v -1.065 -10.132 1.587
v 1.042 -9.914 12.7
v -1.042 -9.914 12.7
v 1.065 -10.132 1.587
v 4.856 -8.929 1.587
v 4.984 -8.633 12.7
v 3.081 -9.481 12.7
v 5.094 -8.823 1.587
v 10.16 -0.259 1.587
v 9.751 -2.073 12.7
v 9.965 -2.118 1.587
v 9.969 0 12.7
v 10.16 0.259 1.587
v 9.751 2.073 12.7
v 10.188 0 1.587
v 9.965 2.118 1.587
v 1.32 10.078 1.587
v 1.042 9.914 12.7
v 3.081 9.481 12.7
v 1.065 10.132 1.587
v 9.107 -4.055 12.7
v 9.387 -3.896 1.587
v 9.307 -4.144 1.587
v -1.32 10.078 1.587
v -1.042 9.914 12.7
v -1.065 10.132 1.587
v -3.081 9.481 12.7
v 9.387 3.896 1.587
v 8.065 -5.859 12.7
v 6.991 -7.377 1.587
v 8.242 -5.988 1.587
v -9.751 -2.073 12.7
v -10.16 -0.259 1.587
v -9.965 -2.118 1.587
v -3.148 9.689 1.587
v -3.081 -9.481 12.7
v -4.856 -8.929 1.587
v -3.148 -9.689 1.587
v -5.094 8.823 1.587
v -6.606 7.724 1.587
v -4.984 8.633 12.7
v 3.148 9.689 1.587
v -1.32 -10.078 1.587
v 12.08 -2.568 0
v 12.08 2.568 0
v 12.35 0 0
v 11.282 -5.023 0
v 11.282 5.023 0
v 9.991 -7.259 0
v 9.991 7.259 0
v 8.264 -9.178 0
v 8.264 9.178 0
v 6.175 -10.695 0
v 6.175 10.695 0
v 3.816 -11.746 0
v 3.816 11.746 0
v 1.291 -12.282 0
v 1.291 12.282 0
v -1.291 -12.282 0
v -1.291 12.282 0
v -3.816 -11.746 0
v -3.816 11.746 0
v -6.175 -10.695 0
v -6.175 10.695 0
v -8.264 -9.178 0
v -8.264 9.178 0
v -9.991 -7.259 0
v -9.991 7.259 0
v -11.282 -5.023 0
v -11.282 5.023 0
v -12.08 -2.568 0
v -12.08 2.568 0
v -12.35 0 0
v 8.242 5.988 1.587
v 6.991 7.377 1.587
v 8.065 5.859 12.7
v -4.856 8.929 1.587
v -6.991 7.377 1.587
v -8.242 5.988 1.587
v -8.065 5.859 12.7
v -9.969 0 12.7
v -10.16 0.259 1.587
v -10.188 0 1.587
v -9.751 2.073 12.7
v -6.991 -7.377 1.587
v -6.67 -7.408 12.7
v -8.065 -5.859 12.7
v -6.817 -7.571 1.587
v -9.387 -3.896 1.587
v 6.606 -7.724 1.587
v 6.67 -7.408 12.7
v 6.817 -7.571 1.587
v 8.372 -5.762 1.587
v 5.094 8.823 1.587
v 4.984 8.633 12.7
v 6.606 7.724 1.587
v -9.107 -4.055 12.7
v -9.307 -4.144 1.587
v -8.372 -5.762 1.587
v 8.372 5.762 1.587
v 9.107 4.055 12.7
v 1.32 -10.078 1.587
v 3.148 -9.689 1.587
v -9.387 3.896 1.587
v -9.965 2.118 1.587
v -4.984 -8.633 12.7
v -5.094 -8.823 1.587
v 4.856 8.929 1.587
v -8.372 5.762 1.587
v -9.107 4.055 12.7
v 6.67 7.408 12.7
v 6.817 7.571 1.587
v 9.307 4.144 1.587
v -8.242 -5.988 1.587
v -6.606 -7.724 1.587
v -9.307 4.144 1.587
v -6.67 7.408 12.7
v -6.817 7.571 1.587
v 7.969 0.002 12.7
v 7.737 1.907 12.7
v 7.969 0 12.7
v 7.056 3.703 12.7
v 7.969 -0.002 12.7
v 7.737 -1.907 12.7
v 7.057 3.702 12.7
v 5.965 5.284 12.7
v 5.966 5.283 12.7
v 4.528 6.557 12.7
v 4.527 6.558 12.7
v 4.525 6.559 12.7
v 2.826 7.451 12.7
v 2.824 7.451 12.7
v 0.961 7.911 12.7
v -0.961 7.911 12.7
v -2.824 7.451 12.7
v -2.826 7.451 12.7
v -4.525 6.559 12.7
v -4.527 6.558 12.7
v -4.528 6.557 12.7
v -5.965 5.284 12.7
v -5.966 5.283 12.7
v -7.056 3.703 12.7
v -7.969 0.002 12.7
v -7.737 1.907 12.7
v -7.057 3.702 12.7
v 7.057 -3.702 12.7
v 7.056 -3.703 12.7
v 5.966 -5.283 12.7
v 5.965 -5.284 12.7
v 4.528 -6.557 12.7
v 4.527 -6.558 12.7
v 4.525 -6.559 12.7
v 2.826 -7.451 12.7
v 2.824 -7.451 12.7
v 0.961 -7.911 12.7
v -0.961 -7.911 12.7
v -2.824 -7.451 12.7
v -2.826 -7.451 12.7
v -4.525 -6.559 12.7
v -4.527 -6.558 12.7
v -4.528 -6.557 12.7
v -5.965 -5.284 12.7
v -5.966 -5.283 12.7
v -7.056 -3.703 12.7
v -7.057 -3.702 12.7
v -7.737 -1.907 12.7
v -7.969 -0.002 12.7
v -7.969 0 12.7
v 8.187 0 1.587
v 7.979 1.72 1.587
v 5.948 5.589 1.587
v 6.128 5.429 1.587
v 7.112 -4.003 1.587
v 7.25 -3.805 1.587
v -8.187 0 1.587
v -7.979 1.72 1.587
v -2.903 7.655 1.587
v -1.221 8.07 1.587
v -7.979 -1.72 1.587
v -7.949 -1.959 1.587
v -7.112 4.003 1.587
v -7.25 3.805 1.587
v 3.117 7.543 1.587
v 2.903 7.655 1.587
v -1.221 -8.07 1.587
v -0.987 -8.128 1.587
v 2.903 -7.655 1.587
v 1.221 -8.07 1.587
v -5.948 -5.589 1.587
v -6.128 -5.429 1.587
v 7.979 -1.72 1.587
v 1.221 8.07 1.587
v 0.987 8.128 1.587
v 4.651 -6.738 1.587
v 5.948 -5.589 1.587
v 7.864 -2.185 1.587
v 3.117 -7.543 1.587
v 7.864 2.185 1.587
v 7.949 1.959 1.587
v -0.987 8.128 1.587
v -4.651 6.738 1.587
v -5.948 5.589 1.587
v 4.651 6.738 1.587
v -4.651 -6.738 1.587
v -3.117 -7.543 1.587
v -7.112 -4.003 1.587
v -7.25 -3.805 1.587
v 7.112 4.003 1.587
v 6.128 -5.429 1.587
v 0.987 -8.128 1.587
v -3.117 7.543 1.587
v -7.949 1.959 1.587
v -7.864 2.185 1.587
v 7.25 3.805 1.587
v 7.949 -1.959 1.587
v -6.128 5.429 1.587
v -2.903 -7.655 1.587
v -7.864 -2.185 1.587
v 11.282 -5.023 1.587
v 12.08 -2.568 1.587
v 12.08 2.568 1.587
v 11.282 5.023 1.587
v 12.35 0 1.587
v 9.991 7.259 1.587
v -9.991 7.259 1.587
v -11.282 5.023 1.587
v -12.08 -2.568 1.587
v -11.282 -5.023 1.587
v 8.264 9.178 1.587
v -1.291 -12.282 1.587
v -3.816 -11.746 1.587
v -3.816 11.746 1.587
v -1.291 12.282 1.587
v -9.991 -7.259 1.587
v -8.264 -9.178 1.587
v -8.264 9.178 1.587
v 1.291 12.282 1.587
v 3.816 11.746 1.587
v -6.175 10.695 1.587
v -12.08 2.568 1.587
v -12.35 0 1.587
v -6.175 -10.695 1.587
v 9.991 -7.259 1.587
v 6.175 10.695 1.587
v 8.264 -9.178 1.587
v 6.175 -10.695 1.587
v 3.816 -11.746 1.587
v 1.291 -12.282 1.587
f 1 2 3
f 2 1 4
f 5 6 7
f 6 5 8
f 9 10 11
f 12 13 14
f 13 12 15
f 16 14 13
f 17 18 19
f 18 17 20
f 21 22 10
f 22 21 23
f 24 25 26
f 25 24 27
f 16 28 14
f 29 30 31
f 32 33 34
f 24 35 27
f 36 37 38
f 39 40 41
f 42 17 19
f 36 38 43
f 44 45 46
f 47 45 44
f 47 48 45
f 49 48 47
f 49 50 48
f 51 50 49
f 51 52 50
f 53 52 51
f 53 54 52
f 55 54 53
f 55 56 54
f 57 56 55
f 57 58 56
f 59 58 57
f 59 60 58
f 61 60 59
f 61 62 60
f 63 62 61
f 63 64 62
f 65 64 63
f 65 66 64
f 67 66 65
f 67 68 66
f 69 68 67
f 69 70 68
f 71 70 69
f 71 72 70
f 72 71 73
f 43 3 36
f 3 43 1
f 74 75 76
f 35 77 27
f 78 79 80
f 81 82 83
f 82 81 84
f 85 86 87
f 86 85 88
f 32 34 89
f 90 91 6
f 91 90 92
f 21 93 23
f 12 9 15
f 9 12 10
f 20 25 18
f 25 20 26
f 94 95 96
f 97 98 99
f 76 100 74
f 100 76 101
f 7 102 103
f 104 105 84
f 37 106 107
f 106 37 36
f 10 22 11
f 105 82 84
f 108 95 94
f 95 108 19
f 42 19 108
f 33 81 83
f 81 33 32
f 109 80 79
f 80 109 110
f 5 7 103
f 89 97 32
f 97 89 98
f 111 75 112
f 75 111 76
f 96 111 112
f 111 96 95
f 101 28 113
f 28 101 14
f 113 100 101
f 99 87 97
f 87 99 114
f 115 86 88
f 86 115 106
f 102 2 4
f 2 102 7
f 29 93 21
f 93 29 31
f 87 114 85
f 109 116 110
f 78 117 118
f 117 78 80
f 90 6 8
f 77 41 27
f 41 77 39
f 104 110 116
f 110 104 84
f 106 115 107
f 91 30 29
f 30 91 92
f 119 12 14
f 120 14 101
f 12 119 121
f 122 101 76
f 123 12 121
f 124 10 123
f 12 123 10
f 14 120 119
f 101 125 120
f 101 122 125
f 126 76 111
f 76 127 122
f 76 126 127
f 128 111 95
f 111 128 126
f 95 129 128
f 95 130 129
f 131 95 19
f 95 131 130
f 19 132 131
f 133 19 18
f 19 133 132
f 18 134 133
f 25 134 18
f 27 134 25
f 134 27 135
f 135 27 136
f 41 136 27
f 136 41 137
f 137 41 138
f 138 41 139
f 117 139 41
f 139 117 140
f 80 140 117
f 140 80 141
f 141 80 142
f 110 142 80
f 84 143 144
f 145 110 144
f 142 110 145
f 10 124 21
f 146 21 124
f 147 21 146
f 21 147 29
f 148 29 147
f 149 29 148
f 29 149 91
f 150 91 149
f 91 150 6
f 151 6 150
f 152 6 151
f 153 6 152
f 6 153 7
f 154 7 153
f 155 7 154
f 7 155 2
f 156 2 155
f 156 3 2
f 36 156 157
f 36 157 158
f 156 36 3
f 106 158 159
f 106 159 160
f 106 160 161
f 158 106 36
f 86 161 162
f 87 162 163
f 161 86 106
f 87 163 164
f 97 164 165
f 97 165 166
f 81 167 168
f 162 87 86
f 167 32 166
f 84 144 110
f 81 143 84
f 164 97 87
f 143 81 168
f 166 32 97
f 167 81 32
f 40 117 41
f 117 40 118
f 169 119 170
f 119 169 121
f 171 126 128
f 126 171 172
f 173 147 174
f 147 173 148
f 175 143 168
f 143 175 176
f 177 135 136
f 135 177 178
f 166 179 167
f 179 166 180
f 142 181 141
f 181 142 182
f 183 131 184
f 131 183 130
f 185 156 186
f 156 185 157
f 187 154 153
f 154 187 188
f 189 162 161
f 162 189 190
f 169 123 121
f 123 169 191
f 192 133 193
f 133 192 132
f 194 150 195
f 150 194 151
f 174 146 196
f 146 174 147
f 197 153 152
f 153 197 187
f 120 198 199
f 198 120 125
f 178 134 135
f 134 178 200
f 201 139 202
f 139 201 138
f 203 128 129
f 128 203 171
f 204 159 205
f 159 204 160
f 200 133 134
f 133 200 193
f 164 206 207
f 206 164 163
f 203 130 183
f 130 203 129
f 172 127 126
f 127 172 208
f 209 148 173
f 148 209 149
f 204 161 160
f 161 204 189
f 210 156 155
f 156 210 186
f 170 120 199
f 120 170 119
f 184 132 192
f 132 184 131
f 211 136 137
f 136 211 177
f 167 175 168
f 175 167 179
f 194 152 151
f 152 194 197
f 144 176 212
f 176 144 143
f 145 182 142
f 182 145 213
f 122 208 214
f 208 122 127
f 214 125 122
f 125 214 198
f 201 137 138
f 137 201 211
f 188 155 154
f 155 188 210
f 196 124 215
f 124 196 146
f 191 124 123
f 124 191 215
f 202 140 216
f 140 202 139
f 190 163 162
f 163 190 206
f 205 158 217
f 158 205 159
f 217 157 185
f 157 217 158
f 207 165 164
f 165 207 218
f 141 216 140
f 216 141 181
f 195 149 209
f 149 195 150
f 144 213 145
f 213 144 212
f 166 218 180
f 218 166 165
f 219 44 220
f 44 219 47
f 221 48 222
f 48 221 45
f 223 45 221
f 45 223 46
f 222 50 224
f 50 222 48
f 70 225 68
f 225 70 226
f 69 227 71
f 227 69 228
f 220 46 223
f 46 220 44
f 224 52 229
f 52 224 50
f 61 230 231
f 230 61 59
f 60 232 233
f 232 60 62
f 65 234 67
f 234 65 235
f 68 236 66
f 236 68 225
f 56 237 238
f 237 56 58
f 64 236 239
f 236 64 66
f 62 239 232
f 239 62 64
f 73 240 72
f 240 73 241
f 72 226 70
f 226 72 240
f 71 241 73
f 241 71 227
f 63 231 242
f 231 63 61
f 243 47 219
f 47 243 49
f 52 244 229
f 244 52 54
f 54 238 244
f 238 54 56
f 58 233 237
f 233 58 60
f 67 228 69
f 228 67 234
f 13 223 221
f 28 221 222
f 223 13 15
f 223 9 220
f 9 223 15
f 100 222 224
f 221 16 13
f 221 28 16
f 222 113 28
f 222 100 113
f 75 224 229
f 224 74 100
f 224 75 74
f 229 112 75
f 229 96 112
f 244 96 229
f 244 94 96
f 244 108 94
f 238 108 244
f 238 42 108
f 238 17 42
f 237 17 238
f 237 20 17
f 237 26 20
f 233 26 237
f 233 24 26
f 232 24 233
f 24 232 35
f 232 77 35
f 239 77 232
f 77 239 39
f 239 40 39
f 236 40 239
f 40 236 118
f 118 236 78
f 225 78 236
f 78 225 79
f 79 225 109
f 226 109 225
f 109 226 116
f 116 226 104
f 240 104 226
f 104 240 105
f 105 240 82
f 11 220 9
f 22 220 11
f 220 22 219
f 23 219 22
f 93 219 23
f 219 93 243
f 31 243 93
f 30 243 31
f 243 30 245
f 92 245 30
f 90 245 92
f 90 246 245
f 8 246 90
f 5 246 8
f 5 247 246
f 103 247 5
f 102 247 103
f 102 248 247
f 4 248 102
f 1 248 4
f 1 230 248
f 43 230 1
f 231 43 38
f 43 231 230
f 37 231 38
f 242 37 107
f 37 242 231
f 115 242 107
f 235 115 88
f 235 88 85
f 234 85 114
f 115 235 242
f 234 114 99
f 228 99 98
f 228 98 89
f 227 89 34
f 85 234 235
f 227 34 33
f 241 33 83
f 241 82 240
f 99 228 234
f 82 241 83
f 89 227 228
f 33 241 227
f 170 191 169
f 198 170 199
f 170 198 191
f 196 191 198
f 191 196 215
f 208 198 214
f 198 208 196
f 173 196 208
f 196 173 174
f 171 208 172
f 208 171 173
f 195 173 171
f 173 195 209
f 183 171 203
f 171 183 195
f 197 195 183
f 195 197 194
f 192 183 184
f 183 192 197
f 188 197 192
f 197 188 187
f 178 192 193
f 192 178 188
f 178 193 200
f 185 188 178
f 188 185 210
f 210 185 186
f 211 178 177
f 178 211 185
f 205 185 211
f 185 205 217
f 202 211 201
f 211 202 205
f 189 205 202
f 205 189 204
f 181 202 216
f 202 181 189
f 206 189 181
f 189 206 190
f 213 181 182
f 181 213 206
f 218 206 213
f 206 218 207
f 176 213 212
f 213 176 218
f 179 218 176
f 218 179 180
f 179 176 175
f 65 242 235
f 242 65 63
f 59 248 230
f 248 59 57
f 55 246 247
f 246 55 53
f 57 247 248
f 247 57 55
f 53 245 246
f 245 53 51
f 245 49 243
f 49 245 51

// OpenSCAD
inch = 25.4;
rim = 0.75 * 1/8 * inch;
id = (3/4+1/16) * inch - 0.2;
length = 0.5 * inch;
thickness = 1/16 * inch;
wall = 2;
id1 = id - 0.5;

difference() {
    cylinder(d1=id,d2=id1,h=length);
    translate([0,0,-0.01]) cylinder(d1=id-wall*2,d2=id1-wall*2,h=length+0.02);
}

cylinder(d=id1+2*rim,h=thickness);
